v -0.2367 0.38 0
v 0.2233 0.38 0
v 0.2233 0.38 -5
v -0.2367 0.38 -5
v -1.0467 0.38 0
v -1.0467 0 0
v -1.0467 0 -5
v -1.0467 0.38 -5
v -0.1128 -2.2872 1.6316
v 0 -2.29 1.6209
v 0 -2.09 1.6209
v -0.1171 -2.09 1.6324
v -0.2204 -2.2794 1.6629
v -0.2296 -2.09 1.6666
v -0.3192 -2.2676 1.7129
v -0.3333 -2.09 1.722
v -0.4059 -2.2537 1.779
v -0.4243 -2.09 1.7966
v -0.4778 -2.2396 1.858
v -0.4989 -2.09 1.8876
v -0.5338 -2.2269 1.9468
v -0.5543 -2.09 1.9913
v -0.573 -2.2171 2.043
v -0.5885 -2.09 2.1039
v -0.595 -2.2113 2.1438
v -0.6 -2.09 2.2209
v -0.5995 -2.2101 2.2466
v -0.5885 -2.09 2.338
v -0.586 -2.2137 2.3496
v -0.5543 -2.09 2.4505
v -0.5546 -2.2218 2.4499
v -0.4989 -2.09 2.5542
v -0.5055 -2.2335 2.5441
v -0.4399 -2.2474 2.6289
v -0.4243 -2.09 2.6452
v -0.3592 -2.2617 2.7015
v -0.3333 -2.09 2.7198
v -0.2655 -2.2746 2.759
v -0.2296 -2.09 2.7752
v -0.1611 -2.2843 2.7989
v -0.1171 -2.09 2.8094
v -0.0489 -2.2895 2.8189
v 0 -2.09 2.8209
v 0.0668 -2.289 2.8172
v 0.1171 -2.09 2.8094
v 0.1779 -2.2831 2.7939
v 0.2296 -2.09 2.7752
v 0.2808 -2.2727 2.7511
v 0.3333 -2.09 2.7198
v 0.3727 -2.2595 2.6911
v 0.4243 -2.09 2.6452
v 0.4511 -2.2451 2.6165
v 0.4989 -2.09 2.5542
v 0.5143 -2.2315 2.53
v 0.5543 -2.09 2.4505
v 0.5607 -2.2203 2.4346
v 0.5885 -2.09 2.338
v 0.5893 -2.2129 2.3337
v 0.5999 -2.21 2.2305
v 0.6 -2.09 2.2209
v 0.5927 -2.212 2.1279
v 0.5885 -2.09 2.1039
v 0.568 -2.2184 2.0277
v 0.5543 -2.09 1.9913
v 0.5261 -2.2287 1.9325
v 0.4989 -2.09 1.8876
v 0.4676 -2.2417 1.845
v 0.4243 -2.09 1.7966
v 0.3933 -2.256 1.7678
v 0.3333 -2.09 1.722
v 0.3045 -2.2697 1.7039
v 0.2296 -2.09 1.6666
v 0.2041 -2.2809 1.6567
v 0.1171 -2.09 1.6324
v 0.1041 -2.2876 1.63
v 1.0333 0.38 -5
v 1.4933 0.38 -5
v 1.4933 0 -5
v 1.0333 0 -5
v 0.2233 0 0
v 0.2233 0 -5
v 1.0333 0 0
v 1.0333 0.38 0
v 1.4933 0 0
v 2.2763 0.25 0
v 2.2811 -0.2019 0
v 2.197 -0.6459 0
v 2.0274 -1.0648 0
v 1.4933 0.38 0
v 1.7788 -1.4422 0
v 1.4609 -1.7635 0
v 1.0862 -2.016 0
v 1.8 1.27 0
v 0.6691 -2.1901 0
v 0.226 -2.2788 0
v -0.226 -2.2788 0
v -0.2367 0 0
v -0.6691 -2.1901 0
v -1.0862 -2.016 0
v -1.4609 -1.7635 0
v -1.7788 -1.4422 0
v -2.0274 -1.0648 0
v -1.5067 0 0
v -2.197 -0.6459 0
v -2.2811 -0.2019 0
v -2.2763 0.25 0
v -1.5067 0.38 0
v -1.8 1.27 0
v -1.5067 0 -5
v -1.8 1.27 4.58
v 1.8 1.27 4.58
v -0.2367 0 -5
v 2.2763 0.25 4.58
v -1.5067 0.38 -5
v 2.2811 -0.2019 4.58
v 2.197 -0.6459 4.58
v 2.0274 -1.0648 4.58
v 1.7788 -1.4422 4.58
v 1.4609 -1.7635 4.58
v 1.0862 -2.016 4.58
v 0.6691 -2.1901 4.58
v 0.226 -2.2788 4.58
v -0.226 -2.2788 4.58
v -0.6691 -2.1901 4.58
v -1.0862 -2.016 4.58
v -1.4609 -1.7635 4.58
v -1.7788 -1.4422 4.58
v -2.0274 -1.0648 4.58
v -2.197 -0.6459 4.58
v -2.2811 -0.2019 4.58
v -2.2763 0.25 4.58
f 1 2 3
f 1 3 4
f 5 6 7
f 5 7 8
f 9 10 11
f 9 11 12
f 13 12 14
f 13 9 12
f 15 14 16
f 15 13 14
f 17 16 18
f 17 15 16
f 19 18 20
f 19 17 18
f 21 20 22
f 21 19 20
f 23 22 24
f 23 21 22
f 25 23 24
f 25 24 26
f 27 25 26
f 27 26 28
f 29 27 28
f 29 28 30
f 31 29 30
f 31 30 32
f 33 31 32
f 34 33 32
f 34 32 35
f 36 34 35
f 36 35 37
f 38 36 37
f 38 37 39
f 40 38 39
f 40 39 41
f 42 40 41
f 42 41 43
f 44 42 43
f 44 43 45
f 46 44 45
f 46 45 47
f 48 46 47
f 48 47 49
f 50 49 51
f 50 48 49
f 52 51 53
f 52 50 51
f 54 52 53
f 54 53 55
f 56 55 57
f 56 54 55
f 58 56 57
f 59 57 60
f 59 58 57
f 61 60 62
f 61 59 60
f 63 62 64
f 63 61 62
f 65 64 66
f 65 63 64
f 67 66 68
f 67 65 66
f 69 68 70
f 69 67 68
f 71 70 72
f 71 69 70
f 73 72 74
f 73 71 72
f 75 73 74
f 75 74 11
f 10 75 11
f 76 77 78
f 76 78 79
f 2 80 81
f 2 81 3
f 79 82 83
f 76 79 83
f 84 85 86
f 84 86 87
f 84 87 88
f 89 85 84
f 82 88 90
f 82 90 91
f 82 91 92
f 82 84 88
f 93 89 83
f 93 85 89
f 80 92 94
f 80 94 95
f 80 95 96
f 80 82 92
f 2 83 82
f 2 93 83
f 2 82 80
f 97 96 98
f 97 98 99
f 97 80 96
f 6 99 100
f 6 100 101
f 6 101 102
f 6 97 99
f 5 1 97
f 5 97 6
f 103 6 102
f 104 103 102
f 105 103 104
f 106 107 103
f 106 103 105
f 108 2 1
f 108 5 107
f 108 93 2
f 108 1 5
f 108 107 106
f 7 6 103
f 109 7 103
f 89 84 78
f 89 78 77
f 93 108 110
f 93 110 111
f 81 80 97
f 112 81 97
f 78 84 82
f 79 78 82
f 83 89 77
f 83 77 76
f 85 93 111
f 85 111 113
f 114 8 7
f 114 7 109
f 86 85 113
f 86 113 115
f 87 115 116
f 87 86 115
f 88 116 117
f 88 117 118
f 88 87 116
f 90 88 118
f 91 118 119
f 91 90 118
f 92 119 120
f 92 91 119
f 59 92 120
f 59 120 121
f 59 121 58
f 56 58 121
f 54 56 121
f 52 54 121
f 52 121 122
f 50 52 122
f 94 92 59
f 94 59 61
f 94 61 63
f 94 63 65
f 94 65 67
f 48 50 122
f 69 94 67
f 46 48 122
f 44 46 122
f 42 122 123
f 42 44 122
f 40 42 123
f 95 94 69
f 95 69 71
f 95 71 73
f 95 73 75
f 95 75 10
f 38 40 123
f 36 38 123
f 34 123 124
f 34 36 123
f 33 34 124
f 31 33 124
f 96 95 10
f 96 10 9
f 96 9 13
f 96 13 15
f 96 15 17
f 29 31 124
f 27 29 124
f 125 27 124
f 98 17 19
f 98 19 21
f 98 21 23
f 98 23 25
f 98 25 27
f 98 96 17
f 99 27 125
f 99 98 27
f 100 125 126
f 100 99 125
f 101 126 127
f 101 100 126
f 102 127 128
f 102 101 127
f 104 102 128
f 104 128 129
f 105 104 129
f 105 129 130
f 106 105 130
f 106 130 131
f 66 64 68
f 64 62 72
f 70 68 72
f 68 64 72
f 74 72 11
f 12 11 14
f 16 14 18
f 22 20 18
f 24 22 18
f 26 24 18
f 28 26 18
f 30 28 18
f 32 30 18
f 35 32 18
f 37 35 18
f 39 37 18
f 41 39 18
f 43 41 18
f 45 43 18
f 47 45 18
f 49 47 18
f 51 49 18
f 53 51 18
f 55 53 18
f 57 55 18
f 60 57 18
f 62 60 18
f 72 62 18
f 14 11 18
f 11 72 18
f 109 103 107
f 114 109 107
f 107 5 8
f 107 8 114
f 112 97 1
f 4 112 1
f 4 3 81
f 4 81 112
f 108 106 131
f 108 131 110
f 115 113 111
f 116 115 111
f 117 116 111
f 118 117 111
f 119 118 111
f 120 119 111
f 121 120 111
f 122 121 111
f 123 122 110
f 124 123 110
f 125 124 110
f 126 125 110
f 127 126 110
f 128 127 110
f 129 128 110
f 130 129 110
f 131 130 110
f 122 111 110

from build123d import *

# Parameters (mm, degrees)
EXTRUDE_1_DEPTH     = 4.58
SKETCH_2_W          = 0.46
SKETCH_2_H          = 0.38
EXTRUDE_2_DEPTH     = 5
SKETCH_3_R          = 0.6
CUT_EXTRUDE_1_DEPTH = 0.2


with BuildPart() as part:
    # 草图1 → 凸台-拉伸1 (new body)
    with BuildSketch(Plane.XY):
        with BuildLine():
            Line((-1.8, 1.27), (-2.276312808, 0.25))
            ThreePointArc((-2.276312808, 0.25), (0, -2.29), (2.276312808, 0.25))
            Line((2.276312808, 0.25), (1.8, 1.27))
            Line((1.8, 1.27), (-1.8, 1.27))
        make_face()
    extrude(amount=EXTRUDE_1_DEPTH)

    # 草图2 → 凸台-拉伸2 (add)
    with BuildSketch(Plane(origin=(0, 0, 0), x_dir=(-1, 0, 0), z_dir=(0, 0, -1))):
        with Locations((0.006718678, 0.19)):
            Rectangle(SKETCH_2_W, SKETCH_2_H)
        with Locations((1.276718678, 0.19)):
            Rectangle(SKETCH_2_W, SKETCH_2_H)
        with Locations((-1.263281322, 0.19)):
            Rectangle(SKETCH_2_W, SKETCH_2_H)
    extrude(amount=EXTRUDE_2_DEPTH)

    # 草图3 → 切除-拉伸1 (cut)
    with BuildSketch(Plane(origin=(0, -2.29, 0), x_dir=(-1, 0, 0), z_dir=(0, 1, 0))):
        with Locations((0, 2.220906824)):
            Circle(SKETCH_3_R)
    extrude(amount=CUT_EXTRUDE_1_DEPTH, mode=Mode.SUBTRACT)


solid = part.part
